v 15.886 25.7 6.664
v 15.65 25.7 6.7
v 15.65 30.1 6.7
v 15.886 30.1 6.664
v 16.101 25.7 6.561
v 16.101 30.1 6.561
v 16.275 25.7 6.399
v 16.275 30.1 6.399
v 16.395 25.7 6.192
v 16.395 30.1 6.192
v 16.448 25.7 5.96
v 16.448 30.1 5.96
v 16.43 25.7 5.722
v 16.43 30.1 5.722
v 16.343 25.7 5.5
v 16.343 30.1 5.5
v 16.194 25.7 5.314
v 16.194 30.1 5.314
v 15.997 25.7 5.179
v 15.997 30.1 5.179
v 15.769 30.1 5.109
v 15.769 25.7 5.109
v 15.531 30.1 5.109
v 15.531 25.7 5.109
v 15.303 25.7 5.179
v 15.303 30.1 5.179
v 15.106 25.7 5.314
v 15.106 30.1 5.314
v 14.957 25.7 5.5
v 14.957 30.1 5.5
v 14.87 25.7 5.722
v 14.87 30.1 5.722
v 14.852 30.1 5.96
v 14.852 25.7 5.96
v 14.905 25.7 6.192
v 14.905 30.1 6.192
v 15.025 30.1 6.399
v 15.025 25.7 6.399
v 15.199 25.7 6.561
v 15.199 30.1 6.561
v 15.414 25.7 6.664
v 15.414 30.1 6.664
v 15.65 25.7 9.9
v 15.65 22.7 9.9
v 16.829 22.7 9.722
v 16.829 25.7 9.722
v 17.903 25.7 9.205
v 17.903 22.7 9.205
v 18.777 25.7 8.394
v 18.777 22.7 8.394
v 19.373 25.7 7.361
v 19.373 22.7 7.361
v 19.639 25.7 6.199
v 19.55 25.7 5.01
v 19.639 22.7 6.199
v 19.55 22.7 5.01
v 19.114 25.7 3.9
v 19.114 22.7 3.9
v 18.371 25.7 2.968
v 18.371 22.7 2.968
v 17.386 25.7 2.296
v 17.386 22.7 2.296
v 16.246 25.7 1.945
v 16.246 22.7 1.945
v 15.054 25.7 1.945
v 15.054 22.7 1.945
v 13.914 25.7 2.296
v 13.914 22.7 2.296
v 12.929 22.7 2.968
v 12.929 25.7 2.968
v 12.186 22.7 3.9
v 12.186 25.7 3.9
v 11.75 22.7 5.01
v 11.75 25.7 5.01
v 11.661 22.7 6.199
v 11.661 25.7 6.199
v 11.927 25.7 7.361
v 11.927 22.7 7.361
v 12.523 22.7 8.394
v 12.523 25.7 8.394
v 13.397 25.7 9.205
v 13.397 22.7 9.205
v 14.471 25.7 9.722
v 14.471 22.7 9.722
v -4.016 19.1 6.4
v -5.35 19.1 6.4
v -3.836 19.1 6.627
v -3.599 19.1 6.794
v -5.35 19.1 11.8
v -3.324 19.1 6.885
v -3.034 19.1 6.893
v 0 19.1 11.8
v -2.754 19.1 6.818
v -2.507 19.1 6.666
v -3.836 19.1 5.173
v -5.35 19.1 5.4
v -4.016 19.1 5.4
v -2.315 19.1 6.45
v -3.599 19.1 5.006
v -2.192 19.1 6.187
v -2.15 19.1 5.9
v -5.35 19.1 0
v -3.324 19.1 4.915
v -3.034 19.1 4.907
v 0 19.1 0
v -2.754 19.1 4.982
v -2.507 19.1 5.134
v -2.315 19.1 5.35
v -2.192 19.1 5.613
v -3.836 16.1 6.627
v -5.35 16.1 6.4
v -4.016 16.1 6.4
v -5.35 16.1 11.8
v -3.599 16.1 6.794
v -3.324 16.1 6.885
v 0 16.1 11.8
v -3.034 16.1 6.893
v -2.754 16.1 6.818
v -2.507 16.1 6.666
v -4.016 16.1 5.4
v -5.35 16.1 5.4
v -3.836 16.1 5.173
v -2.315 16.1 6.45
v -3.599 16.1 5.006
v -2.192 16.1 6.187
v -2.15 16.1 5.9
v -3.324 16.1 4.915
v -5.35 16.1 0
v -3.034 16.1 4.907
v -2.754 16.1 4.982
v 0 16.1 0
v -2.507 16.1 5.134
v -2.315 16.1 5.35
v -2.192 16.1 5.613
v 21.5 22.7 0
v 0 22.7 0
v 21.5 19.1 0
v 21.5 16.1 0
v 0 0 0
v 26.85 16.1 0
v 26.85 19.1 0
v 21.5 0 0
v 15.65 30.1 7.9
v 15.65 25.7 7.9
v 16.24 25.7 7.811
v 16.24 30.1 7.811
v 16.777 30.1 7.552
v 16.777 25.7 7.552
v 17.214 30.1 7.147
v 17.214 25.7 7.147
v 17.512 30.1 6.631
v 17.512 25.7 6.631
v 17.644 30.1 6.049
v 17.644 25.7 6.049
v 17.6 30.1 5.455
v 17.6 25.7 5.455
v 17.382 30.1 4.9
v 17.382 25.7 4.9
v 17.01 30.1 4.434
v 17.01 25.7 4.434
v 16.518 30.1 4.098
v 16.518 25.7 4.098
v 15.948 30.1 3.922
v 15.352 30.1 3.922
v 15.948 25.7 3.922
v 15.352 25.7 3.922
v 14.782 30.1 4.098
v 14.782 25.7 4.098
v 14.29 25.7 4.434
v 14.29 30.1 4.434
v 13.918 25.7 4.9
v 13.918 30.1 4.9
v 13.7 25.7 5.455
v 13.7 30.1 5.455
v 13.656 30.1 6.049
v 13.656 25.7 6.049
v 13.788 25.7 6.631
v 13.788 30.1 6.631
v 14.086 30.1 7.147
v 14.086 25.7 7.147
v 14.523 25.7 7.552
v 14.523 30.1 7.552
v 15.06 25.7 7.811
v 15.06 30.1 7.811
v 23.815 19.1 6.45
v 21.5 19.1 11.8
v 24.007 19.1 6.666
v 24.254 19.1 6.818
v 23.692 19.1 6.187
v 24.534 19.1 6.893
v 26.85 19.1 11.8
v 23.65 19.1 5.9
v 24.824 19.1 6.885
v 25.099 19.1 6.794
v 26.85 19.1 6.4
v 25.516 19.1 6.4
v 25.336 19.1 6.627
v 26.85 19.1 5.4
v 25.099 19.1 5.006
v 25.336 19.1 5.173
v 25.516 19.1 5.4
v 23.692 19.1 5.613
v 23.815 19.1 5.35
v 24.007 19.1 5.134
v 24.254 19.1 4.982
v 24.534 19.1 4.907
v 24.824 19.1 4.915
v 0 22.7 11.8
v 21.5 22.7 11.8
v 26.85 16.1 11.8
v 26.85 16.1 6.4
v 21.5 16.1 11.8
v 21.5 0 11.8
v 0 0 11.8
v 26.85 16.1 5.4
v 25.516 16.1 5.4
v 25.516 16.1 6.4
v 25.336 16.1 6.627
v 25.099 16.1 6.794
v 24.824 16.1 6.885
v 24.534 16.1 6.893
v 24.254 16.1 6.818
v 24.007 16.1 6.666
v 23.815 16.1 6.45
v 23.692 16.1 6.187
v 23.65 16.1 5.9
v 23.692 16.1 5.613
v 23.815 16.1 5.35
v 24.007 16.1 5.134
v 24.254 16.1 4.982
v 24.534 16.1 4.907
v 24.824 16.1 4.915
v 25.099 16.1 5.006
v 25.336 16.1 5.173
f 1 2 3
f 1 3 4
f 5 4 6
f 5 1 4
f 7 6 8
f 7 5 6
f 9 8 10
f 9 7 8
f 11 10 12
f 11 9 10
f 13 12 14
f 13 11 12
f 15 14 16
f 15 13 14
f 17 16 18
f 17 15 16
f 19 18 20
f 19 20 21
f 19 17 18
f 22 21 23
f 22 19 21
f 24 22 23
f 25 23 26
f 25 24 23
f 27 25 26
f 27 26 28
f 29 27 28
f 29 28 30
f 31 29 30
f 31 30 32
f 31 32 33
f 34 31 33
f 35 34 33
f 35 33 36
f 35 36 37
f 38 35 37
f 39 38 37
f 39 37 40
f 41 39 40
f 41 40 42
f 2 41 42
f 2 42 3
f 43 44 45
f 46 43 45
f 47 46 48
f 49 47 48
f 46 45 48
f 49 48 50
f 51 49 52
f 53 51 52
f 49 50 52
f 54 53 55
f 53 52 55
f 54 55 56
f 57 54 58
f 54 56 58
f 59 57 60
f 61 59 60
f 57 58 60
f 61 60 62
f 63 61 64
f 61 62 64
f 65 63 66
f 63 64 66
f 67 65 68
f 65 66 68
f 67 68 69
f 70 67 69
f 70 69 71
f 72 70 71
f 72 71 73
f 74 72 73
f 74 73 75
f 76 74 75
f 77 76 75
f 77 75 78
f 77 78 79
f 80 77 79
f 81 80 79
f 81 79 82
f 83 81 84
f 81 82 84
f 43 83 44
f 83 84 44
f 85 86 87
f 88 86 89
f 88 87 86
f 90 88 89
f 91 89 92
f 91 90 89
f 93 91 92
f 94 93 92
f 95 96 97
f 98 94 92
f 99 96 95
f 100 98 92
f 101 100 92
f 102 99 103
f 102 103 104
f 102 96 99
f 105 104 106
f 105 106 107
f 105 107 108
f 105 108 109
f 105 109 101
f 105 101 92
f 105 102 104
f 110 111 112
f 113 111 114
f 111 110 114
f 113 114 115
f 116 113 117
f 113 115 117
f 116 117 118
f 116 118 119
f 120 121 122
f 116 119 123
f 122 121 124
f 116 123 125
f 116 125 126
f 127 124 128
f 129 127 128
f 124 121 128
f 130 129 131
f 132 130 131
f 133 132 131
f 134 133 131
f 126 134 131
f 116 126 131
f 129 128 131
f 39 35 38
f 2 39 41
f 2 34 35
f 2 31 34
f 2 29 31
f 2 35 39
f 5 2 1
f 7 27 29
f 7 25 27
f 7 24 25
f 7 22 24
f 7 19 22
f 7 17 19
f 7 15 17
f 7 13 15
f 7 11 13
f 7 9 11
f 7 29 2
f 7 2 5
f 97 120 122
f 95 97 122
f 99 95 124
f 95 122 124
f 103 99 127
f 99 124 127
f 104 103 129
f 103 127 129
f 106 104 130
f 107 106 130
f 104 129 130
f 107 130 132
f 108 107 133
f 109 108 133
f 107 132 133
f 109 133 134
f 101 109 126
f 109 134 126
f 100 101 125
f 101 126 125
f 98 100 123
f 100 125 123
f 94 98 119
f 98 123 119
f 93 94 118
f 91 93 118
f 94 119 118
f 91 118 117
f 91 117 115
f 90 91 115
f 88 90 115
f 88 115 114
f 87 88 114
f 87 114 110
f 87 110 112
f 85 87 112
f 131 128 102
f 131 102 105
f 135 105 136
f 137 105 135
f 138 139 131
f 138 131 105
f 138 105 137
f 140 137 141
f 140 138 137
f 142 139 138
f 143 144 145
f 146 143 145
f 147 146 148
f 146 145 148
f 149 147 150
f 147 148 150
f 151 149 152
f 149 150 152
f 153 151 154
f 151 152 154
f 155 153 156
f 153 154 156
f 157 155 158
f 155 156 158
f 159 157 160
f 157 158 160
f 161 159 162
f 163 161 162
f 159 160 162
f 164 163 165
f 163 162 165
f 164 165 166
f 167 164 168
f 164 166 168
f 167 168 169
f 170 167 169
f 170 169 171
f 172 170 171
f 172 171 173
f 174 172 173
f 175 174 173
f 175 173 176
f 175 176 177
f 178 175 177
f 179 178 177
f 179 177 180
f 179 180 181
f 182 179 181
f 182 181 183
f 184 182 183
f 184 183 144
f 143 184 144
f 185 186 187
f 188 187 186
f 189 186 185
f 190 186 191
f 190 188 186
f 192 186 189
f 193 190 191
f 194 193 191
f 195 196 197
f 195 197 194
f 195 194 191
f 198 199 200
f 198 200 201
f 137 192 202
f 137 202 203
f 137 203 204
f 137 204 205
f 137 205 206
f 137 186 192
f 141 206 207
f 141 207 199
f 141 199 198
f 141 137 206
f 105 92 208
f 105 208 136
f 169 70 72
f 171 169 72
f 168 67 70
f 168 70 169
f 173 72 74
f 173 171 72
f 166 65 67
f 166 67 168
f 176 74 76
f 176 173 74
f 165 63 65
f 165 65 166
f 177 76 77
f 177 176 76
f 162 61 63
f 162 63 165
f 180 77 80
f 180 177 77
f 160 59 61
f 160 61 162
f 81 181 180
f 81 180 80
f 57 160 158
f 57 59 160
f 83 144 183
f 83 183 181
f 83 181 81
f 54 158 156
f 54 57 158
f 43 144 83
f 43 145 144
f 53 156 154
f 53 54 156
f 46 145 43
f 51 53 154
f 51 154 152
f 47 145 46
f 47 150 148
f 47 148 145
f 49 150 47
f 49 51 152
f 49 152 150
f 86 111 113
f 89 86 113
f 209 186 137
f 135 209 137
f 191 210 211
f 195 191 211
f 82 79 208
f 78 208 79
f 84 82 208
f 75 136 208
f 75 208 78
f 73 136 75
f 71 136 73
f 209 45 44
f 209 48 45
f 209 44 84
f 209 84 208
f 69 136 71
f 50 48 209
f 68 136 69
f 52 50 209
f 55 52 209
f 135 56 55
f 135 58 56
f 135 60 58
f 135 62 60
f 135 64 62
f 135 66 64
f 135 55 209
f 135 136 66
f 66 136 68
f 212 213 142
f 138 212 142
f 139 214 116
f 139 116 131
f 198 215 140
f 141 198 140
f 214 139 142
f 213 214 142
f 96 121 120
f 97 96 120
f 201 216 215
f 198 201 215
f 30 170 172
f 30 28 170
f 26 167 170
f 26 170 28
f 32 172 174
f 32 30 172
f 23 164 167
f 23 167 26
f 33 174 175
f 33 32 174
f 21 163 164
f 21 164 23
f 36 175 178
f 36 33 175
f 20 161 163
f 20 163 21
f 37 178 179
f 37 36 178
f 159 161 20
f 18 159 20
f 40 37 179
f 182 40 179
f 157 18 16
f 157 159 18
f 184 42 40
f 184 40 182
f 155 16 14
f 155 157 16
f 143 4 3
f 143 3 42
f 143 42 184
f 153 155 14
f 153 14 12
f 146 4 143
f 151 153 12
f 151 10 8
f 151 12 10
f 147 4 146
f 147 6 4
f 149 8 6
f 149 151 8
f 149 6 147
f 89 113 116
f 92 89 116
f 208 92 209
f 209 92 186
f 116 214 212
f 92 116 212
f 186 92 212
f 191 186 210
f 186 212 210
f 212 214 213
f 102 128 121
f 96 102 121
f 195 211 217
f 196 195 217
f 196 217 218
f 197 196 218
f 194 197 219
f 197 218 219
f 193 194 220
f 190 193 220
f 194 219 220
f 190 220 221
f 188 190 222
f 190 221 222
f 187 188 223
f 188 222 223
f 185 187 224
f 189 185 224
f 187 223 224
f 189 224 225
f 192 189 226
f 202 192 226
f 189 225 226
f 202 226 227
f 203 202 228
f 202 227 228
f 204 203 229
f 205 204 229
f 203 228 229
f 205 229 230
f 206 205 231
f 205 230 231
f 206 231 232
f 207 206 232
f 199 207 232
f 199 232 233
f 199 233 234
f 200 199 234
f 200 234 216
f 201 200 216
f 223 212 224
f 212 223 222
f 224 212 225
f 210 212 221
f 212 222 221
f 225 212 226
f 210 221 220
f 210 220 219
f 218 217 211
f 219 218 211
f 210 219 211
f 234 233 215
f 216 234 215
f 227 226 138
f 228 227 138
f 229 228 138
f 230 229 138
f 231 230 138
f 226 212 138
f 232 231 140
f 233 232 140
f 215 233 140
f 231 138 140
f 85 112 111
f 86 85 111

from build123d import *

# Parameters (mm, degrees)
SKETCH_1_W      = 21.5
SKETCH_1_H      = 11.8
EXTRUDE_1_DEPTH = 22.7
EXTRUDE_2_DEPTH = 3
SKETCH_3_R      = 2
SKETCH_3_R_2    = 0.8
EXTRUDE_3_DEPTH = 7.4
SKETCH_6_R      = 4
EXTRUDE_4_DEPTH = 3


with BuildPart() as part:
    # 草图1 → 凸台-拉伸1 (new body)
    with BuildSketch(Plane(origin=(0, 0, 0), x_dir=(1, 0, 0), z_dir=(0, 1, 0))):
        with Locations((10.75, -5.9)):
            Rectangle(SKETCH_1_W, SKETCH_1_H)
    extrude(amount=EXTRUDE_1_DEPTH)

    # 草图2 → 凸台-拉伸2 (add)
    with BuildSketch(Plane(origin=(0, 16.1, 0), x_dir=(1, 0, 0), z_dir=(0, 1, 0))):
        with BuildLine():
            Line((-5.35, -11.8), (0, -11.8))
            Line((0, -11.8), (0, 0))
            Line((0, 0), (-5.35, 0))
            Line((-5.35, 0), (-5.35, -5.4))
            Line((-5.35, -5.4), (-4.016025404, -5.4))
            ThreePointArc((-4.016025404, -5.4), (-2.15, -5.9), (-4.016025404, -6.4))
            Line((-4.016025404, -6.4), (-5.35, -6.4))
            Line((-5.35, -6.4), (-5.35, -11.8))
        make_face()
        with BuildLine():
            Line((26.85, 0), (21.5, 0))
            Line((21.5, 0), (21.5, -11.8))
            Line((21.5, -11.8), (26.85, -11.8))
            Line((26.85, -11.8), (26.85, -6.4))
            Line((26.85, -6.4), (25.516025404, -6.4))
            ThreePointArc((25.516025404, -6.4), (23.65, -5.9), (25.516025404, -5.4))
            Line((25.516025404, -5.4), (26.85, -5.4))
            Line((26.85, -5.4), (26.85, 0))
        make_face()
    extrude(amount=EXTRUDE_2_DEPTH)

    # 草图3 → 凸台-拉伸3 (add)
    with BuildSketch(Plane(origin=(0, 22.7, 0), x_dir=(1, 0, 0), z_dir=(0, 1, 0))):
        with Locations(Location((15.65, -5.9, 0), (0, 0, 270))):
            Circle(SKETCH_3_R)
        with Locations(Location((15.65, -5.9, 0), (0, 0, 270))):
            Circle(SKETCH_3_R_2, mode=Mode.SUBTRACT)
    extrude(amount=EXTRUDE_3_DEPTH)

    # 草图6 → 凸台-拉伸4 (add)
    with BuildSketch(Plane(origin=(0, 22.7, 0), x_dir=(1, 0, 0), z_dir=(0, 1, 0))):
        with Locations(Location((15.65, -5.9, 0), (0, 0, 270))):
            Circle(SKETCH_6_R)
    extrude(amount=EXTRUDE_4_DEPTH)


solid = part.part
